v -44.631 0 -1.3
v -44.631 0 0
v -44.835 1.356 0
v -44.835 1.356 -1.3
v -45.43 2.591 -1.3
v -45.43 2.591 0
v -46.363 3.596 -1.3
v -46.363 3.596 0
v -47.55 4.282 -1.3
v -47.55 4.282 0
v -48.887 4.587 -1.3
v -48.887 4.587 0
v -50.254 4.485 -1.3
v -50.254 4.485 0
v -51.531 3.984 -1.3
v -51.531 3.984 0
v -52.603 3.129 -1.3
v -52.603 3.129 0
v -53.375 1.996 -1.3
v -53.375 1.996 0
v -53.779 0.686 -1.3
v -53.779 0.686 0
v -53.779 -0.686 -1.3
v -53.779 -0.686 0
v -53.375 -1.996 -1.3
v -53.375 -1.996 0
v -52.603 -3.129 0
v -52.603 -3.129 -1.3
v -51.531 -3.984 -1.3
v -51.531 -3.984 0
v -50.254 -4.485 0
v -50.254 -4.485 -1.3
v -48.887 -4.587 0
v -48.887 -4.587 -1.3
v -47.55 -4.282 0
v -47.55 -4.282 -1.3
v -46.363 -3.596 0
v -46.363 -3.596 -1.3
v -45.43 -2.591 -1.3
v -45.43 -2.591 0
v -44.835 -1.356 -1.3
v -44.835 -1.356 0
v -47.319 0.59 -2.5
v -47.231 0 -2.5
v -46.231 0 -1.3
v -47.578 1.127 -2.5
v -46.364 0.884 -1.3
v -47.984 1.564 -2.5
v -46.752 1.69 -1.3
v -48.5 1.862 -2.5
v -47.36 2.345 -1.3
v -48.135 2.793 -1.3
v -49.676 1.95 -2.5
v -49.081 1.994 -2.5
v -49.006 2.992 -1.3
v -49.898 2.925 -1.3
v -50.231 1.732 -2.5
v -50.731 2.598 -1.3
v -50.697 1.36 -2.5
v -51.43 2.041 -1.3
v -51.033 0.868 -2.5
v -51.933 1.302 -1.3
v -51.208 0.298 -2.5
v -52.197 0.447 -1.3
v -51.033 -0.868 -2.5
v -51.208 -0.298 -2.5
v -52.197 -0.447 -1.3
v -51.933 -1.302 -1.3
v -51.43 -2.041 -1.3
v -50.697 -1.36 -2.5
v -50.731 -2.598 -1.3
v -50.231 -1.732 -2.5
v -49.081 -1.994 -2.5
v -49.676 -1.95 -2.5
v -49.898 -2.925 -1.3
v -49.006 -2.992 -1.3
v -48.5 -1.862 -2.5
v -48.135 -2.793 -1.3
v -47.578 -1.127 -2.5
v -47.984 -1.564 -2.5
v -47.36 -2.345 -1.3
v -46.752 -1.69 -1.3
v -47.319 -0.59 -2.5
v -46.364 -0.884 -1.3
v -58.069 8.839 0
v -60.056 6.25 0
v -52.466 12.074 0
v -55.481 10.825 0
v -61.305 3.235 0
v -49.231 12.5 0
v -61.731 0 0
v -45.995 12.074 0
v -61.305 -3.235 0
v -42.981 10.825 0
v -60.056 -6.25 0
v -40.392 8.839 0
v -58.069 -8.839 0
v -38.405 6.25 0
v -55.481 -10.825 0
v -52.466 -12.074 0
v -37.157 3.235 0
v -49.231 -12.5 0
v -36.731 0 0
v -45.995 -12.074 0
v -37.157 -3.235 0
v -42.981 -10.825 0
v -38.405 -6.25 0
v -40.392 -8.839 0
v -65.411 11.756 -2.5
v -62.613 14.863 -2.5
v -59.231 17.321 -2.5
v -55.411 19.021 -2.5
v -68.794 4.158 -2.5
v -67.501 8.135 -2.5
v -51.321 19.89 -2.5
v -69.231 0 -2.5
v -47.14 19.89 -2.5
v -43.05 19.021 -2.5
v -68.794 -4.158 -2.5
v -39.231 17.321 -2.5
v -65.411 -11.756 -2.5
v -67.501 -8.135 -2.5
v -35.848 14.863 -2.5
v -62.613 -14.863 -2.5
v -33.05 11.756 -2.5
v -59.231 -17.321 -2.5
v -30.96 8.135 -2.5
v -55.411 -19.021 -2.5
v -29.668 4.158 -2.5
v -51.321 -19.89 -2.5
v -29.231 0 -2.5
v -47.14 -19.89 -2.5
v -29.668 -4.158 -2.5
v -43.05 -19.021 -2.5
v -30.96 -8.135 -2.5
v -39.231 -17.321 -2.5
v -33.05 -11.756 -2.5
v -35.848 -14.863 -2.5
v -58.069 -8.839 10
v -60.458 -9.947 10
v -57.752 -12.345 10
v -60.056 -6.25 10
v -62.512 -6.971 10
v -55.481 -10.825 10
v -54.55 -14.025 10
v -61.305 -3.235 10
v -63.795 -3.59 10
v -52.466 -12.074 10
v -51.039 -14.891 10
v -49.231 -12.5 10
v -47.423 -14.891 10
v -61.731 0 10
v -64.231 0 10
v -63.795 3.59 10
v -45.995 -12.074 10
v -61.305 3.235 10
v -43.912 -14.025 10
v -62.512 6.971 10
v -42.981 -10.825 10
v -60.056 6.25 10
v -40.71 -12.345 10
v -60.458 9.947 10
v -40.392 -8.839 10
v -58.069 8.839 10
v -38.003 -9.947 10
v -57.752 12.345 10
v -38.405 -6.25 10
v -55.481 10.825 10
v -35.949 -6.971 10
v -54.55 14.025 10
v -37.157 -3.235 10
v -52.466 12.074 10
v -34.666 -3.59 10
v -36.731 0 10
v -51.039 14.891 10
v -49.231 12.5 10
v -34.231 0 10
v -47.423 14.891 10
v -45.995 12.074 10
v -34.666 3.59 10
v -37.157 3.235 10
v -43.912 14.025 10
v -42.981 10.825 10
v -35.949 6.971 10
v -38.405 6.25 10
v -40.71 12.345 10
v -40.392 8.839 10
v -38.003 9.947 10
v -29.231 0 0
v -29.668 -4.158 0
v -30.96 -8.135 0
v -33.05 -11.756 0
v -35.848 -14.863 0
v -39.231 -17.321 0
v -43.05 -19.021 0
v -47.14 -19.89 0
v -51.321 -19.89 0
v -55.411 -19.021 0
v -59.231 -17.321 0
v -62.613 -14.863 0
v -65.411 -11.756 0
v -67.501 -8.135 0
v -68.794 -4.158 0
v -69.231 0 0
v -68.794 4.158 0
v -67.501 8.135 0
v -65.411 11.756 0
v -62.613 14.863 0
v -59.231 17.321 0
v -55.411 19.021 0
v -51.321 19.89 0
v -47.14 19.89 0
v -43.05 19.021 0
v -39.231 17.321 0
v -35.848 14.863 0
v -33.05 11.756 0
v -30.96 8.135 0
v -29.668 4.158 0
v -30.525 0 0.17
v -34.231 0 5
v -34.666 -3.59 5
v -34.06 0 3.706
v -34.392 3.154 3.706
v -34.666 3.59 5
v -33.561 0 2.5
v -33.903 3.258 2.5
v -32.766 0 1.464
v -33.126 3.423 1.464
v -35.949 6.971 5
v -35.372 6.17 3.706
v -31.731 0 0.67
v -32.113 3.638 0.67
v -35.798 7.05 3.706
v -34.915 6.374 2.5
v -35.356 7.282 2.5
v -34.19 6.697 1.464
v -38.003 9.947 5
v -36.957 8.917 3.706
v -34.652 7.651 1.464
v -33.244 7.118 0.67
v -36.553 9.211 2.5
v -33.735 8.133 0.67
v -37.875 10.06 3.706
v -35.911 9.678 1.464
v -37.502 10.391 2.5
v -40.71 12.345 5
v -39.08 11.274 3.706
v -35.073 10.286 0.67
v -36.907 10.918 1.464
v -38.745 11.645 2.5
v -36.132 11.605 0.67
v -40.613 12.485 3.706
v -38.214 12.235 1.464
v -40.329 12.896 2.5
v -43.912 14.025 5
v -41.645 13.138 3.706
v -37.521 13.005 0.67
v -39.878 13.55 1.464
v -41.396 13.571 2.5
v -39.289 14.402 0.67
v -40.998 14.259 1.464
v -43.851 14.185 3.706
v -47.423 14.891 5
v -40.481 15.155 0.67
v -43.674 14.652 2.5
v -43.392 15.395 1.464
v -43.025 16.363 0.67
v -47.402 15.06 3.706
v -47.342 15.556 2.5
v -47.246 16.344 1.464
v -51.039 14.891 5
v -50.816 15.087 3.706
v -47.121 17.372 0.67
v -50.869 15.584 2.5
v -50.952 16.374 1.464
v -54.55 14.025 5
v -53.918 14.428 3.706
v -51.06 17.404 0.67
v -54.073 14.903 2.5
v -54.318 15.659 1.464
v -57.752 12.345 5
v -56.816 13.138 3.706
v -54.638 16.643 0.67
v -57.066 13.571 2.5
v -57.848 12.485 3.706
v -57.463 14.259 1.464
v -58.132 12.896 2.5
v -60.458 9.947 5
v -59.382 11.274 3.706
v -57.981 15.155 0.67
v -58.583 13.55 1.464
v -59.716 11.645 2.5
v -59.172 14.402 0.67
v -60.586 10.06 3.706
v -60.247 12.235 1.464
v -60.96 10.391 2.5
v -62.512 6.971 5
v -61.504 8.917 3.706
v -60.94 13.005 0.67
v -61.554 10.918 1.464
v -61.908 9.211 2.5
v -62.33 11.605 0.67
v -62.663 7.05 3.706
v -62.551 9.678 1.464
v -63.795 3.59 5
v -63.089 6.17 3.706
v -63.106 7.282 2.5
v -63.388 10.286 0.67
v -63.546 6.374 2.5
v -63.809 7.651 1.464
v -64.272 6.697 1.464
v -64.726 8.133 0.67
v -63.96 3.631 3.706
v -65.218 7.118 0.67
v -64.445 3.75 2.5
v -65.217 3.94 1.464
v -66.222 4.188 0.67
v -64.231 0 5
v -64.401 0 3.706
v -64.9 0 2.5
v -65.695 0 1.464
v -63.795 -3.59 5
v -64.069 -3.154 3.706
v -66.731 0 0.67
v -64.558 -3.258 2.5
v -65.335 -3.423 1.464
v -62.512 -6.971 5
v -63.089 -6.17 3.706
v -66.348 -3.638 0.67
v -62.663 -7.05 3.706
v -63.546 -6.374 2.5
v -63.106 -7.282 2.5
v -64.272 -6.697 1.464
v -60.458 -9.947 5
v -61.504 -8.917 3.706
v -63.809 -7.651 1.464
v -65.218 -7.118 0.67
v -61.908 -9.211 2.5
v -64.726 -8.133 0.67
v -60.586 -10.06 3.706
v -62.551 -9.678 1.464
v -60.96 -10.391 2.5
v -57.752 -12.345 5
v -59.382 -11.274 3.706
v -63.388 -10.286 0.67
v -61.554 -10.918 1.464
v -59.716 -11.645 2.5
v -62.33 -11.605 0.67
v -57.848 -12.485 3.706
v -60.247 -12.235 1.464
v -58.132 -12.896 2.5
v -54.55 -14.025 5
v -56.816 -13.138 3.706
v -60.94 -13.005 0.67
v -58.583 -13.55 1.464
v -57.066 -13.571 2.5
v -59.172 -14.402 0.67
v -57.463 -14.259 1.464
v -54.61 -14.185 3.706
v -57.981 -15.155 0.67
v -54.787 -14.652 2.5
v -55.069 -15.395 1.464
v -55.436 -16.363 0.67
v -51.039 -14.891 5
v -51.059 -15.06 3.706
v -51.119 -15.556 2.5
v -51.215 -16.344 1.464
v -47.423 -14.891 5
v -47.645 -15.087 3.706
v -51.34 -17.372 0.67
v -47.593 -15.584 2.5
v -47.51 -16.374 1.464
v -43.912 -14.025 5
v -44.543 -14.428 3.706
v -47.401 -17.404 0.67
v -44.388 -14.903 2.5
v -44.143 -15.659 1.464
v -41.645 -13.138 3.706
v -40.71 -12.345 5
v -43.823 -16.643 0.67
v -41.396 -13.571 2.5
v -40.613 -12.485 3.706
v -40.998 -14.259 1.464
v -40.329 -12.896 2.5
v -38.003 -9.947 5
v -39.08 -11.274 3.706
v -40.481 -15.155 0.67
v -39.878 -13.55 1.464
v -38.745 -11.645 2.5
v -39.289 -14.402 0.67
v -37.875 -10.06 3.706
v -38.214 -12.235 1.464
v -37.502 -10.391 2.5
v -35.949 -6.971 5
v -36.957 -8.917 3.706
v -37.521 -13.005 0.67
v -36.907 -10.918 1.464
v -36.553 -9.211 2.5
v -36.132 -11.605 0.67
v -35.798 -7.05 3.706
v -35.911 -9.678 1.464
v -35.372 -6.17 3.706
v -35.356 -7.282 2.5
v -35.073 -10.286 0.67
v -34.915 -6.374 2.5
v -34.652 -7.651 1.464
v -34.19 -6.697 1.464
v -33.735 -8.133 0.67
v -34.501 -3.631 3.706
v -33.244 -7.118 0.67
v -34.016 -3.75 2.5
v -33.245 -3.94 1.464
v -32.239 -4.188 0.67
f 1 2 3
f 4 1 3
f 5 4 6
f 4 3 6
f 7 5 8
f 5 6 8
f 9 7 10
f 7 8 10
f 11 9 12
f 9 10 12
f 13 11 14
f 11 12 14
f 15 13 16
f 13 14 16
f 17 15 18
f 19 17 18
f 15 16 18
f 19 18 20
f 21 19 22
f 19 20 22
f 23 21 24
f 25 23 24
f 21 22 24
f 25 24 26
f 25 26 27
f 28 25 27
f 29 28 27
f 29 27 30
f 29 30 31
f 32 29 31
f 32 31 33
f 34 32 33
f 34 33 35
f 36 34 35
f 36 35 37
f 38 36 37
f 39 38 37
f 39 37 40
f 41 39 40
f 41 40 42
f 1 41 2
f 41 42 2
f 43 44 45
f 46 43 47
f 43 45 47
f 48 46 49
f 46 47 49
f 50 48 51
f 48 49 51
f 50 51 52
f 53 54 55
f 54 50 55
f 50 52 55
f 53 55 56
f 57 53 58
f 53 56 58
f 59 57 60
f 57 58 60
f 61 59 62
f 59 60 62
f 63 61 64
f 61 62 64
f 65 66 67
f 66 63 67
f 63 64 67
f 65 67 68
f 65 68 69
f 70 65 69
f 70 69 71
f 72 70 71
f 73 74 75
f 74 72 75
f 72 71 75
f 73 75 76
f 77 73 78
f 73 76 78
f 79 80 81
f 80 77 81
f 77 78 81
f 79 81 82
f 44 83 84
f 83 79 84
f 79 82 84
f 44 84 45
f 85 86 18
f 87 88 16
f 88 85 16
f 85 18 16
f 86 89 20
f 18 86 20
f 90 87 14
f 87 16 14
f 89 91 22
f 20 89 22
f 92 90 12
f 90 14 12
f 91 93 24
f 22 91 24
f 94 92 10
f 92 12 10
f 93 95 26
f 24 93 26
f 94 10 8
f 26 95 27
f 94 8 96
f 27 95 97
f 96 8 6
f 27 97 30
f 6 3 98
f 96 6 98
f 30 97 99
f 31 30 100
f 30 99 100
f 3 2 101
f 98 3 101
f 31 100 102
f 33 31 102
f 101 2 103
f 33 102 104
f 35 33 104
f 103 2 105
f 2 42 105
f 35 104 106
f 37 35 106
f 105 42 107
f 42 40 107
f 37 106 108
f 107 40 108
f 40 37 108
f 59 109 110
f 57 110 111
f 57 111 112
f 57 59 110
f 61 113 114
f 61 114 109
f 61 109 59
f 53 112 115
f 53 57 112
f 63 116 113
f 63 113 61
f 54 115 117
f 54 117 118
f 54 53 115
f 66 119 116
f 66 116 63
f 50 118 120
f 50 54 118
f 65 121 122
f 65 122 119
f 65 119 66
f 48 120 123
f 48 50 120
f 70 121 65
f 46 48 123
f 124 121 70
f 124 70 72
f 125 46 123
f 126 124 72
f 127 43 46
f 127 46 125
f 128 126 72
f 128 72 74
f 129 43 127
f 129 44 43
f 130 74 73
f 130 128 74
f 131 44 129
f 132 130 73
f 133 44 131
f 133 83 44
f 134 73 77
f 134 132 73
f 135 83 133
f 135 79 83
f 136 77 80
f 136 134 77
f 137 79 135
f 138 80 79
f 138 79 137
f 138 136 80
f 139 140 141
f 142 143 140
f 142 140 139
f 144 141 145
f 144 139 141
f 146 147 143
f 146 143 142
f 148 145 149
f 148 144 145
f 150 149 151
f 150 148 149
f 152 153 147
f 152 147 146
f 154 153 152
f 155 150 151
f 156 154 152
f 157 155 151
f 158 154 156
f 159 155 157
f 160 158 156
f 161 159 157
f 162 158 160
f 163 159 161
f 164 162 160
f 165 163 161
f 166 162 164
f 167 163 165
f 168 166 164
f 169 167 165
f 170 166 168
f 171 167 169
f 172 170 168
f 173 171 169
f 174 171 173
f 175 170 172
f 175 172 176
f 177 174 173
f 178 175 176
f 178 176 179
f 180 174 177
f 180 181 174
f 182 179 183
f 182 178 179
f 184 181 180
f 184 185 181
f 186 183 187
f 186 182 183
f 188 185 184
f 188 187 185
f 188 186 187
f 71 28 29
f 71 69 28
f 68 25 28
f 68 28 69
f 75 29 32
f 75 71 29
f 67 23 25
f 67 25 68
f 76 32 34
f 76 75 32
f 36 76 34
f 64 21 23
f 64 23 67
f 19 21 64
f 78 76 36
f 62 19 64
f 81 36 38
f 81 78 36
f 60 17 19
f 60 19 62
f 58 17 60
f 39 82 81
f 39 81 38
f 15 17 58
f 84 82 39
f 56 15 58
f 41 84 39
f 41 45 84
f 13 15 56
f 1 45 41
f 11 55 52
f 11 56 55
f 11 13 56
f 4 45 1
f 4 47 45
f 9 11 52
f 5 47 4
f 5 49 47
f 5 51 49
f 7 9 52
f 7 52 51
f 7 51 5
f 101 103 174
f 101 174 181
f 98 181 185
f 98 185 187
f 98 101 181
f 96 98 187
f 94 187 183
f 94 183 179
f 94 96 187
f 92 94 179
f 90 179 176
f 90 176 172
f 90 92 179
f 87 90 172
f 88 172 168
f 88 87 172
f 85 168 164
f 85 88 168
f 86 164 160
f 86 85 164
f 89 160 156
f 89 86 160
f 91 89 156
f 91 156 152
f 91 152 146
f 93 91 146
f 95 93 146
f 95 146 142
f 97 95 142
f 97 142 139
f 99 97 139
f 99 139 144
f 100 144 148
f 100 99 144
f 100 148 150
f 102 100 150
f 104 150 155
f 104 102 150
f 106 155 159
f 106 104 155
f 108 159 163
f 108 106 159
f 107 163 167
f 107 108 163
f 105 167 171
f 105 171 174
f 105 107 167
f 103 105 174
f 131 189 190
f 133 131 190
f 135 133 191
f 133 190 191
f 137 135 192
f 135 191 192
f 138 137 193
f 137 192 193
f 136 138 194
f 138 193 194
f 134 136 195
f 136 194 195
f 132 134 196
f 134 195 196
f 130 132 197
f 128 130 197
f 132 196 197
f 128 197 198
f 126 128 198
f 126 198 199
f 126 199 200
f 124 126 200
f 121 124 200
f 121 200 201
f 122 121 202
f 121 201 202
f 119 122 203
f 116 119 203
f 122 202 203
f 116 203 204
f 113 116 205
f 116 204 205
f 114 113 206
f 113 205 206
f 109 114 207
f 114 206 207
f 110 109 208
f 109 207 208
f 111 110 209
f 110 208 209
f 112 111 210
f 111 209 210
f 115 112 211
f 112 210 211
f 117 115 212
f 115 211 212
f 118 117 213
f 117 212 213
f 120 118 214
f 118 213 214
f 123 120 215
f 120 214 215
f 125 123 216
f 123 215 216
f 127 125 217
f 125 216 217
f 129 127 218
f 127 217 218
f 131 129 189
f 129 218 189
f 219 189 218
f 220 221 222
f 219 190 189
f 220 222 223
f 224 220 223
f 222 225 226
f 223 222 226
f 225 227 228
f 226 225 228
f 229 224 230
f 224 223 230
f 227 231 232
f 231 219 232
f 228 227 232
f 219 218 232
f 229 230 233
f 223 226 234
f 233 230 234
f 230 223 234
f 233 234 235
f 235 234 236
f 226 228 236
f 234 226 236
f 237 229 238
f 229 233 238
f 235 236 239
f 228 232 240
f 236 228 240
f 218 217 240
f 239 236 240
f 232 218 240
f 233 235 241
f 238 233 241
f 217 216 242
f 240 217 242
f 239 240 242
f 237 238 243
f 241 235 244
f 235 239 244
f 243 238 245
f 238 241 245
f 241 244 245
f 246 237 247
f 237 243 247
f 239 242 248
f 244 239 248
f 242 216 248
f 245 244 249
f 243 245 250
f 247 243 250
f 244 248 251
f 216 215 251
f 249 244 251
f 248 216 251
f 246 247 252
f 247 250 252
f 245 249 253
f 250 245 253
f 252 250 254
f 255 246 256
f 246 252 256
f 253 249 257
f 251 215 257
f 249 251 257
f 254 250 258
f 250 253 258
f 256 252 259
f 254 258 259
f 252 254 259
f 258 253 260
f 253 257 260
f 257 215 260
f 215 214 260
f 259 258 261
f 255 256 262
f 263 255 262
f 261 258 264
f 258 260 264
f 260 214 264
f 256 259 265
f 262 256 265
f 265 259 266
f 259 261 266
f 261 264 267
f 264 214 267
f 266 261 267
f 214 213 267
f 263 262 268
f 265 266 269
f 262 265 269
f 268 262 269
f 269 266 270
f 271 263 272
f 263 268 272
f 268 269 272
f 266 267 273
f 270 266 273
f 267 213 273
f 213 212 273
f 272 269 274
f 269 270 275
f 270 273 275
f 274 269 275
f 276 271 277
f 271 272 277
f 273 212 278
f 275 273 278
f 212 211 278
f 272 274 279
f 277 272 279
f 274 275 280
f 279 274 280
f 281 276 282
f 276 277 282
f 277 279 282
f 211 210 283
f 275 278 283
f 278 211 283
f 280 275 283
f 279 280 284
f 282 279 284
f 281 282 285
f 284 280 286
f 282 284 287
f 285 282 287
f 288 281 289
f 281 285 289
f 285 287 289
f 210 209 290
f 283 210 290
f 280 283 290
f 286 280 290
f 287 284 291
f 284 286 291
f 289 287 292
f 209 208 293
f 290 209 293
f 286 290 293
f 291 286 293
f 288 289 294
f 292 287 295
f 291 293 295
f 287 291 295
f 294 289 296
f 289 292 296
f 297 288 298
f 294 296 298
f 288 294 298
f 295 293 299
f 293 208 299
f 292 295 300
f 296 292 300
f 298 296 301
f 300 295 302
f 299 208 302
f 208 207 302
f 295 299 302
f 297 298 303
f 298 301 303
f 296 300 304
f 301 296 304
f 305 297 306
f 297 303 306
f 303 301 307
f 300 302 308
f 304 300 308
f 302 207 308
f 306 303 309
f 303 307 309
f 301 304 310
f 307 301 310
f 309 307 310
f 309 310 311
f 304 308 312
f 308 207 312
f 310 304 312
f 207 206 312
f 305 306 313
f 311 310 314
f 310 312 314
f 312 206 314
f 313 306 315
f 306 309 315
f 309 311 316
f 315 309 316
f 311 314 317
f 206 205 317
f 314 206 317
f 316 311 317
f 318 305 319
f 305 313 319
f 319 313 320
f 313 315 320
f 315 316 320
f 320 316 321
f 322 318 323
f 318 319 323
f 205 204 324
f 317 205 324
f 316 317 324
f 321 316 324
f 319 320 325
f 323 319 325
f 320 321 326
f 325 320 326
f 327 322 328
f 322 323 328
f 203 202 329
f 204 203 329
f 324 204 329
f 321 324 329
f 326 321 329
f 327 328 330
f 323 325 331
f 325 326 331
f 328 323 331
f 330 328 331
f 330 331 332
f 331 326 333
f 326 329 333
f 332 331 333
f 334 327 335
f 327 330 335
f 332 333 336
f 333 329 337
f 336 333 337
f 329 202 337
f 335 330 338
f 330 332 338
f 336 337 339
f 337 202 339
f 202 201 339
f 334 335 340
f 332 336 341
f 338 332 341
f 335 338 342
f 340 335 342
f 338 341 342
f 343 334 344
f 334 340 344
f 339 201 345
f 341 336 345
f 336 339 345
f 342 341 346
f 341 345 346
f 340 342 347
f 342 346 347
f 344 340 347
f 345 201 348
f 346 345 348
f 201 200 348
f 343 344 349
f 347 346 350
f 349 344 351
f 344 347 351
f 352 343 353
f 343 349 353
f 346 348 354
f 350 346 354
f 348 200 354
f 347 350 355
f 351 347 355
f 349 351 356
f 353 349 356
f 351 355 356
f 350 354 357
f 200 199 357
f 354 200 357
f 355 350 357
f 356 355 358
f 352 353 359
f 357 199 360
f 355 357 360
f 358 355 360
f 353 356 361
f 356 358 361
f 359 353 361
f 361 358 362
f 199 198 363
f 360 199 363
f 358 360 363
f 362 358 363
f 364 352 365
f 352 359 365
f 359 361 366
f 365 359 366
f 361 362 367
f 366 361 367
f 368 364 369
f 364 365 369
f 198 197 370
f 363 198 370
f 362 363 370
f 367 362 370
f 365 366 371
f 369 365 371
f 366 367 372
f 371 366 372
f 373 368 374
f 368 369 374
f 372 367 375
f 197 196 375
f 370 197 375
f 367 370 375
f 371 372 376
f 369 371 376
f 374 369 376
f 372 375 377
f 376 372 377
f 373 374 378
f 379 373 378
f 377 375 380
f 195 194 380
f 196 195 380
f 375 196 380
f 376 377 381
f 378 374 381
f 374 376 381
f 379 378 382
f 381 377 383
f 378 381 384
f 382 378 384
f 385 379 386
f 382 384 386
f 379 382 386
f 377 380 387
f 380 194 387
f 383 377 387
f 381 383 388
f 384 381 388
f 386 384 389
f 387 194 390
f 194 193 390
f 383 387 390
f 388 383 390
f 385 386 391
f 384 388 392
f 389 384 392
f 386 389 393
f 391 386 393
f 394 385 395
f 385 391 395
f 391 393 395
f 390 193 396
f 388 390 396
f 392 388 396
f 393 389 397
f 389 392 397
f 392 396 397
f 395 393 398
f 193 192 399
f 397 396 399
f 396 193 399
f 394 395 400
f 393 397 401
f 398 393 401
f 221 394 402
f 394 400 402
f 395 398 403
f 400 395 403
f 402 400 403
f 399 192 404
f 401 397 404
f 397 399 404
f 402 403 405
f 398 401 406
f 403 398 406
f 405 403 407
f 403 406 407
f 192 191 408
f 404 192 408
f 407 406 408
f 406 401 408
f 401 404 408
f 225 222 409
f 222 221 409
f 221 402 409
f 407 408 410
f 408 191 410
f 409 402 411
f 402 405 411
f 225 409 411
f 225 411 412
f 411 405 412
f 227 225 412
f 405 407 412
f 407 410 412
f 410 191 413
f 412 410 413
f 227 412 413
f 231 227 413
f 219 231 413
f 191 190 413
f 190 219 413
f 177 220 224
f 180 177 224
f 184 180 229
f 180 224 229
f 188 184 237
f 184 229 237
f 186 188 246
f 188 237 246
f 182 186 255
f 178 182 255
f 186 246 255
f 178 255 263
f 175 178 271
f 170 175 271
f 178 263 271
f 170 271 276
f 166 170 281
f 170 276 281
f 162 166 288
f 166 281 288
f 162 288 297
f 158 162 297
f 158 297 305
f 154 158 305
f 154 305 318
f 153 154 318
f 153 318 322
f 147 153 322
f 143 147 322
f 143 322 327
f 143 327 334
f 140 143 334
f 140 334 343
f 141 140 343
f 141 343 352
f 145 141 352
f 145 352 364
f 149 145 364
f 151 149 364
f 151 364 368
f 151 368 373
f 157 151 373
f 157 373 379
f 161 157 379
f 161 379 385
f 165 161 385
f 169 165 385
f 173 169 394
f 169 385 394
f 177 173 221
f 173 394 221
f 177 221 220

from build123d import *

# Parameters (mm, degrees)
CYLINDER_R         = 12.5
CYLINDER_DEPTH     = 10
CYLINDER001_R      = 15
CYLINDER001_DEPTH  = 10
TORUS_R            = 5
TUBE_R             = 20
TUBE_R_2           = 15
TUBE_DEPTH         = 5
CIRCLE002_R        = 4.6
EXTRUSION002_DEPTH = 1.3
CIRCLE001_R        = 2
EXTRUSION001_DEPTH = 42.073439
CIRCLE_R           = 20
EXTRUSION_DEPTH    = 2.5


with BuildPart() as cylinder:
    # Cylinder → Cylinder (new body)
    with BuildSketch(Plane.XY):
        Circle(CYLINDER_R)
    extrude(amount=CYLINDER_DEPTH)


with BuildPart() as cut:
    # Cylinder001 → Cylinder001 (new body)
    with BuildSketch(Plane.XY):
        Circle(CYLINDER001_R)
    extrude(amount=CYLINDER001_DEPTH)

    # Cut: cut Cylinder
    add(cylinder.part, mode=Mode.SUBTRACT)


with BuildPart() as torus:
    # Torus → Torus (revolve)
    with BuildSketch(Plane(origin=(0, 0, 5), x_dir=(1, 0, 0), z_dir=(0, -1, 0))):
        with Locations((20, 0)):
            Circle(TORUS_R)
    revolve(axis=Axis((0, 0, 5), (0, 0, 1)))


with BuildPart() as fusion:
    # Tube → Tube (new body)
    with BuildSketch(Plane.XY):
        Circle(TUBE_R)
        Circle(TUBE_R_2, mode=Mode.SUBTRACT)
    extrude(amount=TUBE_DEPTH)

    # Cut001: cut Torus
    add(torus.part, mode=Mode.SUBTRACT)

    # Fusion: union Cut
    add(cut.part)


with BuildPart() as cone:
    # Cone → Cone (revolve)
    with BuildSketch(Plane(origin=(0, 0, -2.5), x_dir=(1, 0, 0), z_dir=(0, -1, 0))):
        Polygon((0, 0), (2, 0), (3, 1.2), (0, 1.2), align=None)
    revolve(axis=Axis((0, 0, -2.5), (0, 0, 1)))


with BuildPart() as extrusion002:
    # Circle002 → Extrusion002 (new body)
    with BuildSketch(Plane.XY):
        Circle(CIRCLE002_R)
    extrude(amount=-EXTRUSION002_DEPTH)


with BuildPart() as extrusion001:
    # Circle001 → Extrusion001 (new body)
    with BuildSketch(Plane(origin=(0, 0, -2.5), x_dir=(1, 0, 0), z_dir=(0, 0, -1))):
        Circle(CIRCLE001_R)
    extrude(amount=-EXTRUSION001_DEPTH)


with BuildPart() as fusion001001:
    # Circle → Extrusion (new body)
    with BuildSketch(Plane(origin=(0, 0, 0), x_dir=(1, 0, 0), z_dir=(0, 0, -1))):
        Circle(CIRCLE_R)
    extrude(amount=EXTRUSION_DEPTH)

    # Cut002: cut Extrusion001
    add(extrusion001.part, mode=Mode.SUBTRACT)

    # Cut003: cut Extrusion002
    add(extrusion002.part, mode=Mode.SUBTRACT)

    # Cut004: cut Cone
    add(cone.part, mode=Mode.SUBTRACT)

    # Fusion001: union Fusion
    add(fusion.part)


with BuildPart() as fusion001001_1:
    # Fusion001001 placement: moved
    add(fusion001001.part.moved(Location((-49.230581, 0, 0))))


solid = fusion001001_1.part
